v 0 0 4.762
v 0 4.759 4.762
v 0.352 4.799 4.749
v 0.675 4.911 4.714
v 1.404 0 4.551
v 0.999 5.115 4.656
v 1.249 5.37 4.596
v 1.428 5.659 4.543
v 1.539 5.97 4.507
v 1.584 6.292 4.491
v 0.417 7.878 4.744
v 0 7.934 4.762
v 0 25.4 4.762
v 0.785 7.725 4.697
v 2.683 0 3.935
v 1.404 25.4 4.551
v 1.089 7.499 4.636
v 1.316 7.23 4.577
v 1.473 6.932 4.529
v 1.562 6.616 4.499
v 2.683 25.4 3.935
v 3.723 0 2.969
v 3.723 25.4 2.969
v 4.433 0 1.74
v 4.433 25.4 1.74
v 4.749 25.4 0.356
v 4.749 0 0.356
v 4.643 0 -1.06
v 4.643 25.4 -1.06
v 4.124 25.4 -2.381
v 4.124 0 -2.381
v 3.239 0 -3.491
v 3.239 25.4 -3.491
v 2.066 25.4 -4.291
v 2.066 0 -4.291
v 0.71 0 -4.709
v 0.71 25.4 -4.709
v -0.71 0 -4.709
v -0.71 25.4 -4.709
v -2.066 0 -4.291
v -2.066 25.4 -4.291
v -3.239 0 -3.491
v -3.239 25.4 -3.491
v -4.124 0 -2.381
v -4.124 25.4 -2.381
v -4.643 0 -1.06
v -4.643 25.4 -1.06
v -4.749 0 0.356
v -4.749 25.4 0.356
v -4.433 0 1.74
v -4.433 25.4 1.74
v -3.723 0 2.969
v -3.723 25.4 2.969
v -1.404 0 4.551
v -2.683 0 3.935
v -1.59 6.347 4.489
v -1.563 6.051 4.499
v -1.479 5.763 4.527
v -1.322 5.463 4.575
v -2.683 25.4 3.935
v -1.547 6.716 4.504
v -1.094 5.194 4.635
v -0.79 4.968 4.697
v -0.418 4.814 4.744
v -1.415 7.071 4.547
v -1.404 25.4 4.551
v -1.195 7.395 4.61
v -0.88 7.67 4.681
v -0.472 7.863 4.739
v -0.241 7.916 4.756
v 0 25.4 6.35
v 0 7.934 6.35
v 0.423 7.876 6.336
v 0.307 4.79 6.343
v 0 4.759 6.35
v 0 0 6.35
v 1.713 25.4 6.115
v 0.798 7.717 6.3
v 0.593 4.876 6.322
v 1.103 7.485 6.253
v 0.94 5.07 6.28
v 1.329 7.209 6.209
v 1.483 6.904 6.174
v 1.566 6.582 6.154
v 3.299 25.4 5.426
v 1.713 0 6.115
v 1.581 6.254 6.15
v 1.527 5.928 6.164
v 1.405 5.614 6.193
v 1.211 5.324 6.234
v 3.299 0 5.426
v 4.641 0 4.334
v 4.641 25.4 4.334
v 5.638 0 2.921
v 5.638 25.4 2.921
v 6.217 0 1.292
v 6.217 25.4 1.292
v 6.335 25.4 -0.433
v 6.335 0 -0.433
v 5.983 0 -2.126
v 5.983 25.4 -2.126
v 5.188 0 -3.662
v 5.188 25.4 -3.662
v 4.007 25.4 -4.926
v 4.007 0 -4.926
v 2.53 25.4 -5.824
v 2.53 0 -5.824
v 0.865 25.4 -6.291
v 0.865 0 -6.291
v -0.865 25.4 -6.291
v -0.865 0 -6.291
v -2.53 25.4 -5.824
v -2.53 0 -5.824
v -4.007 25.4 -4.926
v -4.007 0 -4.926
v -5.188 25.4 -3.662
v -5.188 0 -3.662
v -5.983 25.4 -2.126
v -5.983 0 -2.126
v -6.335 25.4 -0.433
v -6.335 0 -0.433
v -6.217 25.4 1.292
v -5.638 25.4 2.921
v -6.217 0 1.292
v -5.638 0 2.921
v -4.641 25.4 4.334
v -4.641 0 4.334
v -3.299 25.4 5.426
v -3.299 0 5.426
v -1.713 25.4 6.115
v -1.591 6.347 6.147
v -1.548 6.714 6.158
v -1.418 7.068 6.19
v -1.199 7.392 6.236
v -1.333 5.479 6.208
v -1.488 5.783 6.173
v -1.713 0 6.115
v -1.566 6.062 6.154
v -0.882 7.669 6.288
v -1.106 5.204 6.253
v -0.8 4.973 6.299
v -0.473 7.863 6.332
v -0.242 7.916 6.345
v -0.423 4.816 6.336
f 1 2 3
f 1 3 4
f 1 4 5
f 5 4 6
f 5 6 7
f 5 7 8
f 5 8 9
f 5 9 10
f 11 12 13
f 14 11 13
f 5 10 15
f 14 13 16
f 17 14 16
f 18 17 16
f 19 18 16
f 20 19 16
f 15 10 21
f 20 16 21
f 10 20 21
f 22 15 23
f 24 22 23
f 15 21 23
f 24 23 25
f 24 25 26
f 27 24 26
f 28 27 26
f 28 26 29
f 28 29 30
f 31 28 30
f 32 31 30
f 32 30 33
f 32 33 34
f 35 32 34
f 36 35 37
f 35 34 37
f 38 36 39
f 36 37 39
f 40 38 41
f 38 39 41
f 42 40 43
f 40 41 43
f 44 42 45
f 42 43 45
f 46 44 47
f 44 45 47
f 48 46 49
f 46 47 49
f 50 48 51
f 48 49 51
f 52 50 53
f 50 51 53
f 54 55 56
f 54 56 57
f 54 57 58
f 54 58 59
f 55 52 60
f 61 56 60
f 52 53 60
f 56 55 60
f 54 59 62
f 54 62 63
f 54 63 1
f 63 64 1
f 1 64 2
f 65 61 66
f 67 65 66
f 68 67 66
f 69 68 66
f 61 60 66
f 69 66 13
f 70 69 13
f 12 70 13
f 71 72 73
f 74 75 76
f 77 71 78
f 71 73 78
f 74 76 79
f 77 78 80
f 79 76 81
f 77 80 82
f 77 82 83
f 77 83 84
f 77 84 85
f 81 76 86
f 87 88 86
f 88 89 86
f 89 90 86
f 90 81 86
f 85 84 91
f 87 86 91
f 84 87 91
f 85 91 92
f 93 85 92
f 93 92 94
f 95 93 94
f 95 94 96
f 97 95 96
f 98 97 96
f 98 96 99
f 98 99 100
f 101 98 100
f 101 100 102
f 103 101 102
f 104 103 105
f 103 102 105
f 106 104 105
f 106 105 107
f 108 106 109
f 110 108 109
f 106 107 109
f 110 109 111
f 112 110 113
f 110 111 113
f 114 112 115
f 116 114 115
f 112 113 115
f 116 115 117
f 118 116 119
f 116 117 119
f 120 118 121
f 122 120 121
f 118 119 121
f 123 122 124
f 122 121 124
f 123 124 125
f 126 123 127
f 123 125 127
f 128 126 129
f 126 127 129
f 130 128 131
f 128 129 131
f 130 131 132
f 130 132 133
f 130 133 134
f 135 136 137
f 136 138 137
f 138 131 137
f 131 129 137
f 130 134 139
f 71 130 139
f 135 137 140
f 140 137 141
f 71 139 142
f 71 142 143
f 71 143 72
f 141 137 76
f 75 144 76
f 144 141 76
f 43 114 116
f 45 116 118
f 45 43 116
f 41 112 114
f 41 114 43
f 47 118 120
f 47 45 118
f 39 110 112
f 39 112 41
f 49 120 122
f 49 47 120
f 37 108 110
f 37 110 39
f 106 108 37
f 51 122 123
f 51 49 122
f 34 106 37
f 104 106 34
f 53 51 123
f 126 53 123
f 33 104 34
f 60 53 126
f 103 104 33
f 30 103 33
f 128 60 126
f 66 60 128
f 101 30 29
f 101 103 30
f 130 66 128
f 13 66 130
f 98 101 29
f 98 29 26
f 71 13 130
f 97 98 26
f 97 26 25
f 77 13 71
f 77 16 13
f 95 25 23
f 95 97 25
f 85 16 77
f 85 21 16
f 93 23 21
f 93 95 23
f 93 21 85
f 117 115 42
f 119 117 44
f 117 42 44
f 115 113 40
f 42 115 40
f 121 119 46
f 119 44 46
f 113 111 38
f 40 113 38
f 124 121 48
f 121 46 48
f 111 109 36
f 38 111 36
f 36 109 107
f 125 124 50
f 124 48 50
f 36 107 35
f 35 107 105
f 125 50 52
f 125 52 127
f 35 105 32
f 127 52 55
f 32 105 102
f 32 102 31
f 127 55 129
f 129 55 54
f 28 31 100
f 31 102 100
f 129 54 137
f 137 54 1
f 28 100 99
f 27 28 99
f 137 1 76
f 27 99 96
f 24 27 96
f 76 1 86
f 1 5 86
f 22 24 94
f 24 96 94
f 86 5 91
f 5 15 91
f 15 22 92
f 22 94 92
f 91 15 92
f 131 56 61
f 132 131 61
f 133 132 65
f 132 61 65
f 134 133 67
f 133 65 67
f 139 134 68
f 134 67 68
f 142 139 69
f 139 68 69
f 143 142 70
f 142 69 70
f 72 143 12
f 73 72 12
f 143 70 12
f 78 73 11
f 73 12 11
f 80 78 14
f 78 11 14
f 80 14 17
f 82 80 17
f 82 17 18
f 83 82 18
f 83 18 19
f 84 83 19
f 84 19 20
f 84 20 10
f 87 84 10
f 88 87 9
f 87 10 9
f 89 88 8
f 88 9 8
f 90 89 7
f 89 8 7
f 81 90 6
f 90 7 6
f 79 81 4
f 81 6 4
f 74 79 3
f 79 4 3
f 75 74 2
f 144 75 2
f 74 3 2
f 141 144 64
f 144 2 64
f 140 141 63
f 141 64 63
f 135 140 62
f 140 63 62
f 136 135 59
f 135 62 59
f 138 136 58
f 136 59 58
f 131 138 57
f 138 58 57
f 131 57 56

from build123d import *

# Parameters (mm, degrees)
SKETCH1_R                        = 6.35
BOSS_EXTRUDE1_DEPTH              = 25.4
SKETCH3_R                        = 4.7625
CUT_EXTRUDE1_DEPTH               = 27.940768363
F_1_8_0_125_DIAMETER_HOLE2_D     = 3.175
F_1_8_0_125_DIAMETER_HOLE2_DEPTH = 6.349
F_1_8_0_125_DIAMETER_HOLE2_TIP   = 0.953866233


with BuildPart() as part:
    # Sketch1 → Boss-Extrude1 (new body)
    with BuildSketch(Plane(origin=(0, 0, 0), x_dir=(1, 0, 0), z_dir=(0, 1, 0))):
        with Locations(Location((0, 0, 0), (0, 0, 270))):
            Circle(SKETCH1_R)
    extrude(amount=BOSS_EXTRUDE1_DEPTH)

    # Sketch3 → Cut-Extrude1 (cut, through all)
    with BuildSketch(Plane(origin=(0, 25.4, 0), x_dir=(1, 0, 0), z_dir=(0, 1, 0))):
        with Locations(Location((0, 0, 0), (0, 0, 270))):
            Circle(SKETCH3_R)
    extrude(amount=-CUT_EXTRUDE1_DEPTH, mode=Mode.SUBTRACT)

    # 1/8 (0.125) Diameter Hole2
    with Locations(Plane(origin=(-0.004002873, 6.346663359, 6.349998738), x_dir=(0.999999801314, 0, 0.000630373746), z_dir=(-0.000630373746, 0, 0.999999801314))):
        with Locations((0, 0)):
            Hole(F_1_8_0_125_DIAMETER_HOLE2_D / 2, depth=F_1_8_0_125_DIAMETER_HOLE2_DEPTH)
            with Locations((0, 0, -(F_1_8_0_125_DIAMETER_HOLE2_DEPTH + F_1_8_0_125_DIAMETER_HOLE2_TIP / 2))):  # 118° drill point
                Cone(0, F_1_8_0_125_DIAMETER_HOLE2_D / 2, F_1_8_0_125_DIAMETER_HOLE2_TIP, mode=Mode.SUBTRACT)


solid = part.part
